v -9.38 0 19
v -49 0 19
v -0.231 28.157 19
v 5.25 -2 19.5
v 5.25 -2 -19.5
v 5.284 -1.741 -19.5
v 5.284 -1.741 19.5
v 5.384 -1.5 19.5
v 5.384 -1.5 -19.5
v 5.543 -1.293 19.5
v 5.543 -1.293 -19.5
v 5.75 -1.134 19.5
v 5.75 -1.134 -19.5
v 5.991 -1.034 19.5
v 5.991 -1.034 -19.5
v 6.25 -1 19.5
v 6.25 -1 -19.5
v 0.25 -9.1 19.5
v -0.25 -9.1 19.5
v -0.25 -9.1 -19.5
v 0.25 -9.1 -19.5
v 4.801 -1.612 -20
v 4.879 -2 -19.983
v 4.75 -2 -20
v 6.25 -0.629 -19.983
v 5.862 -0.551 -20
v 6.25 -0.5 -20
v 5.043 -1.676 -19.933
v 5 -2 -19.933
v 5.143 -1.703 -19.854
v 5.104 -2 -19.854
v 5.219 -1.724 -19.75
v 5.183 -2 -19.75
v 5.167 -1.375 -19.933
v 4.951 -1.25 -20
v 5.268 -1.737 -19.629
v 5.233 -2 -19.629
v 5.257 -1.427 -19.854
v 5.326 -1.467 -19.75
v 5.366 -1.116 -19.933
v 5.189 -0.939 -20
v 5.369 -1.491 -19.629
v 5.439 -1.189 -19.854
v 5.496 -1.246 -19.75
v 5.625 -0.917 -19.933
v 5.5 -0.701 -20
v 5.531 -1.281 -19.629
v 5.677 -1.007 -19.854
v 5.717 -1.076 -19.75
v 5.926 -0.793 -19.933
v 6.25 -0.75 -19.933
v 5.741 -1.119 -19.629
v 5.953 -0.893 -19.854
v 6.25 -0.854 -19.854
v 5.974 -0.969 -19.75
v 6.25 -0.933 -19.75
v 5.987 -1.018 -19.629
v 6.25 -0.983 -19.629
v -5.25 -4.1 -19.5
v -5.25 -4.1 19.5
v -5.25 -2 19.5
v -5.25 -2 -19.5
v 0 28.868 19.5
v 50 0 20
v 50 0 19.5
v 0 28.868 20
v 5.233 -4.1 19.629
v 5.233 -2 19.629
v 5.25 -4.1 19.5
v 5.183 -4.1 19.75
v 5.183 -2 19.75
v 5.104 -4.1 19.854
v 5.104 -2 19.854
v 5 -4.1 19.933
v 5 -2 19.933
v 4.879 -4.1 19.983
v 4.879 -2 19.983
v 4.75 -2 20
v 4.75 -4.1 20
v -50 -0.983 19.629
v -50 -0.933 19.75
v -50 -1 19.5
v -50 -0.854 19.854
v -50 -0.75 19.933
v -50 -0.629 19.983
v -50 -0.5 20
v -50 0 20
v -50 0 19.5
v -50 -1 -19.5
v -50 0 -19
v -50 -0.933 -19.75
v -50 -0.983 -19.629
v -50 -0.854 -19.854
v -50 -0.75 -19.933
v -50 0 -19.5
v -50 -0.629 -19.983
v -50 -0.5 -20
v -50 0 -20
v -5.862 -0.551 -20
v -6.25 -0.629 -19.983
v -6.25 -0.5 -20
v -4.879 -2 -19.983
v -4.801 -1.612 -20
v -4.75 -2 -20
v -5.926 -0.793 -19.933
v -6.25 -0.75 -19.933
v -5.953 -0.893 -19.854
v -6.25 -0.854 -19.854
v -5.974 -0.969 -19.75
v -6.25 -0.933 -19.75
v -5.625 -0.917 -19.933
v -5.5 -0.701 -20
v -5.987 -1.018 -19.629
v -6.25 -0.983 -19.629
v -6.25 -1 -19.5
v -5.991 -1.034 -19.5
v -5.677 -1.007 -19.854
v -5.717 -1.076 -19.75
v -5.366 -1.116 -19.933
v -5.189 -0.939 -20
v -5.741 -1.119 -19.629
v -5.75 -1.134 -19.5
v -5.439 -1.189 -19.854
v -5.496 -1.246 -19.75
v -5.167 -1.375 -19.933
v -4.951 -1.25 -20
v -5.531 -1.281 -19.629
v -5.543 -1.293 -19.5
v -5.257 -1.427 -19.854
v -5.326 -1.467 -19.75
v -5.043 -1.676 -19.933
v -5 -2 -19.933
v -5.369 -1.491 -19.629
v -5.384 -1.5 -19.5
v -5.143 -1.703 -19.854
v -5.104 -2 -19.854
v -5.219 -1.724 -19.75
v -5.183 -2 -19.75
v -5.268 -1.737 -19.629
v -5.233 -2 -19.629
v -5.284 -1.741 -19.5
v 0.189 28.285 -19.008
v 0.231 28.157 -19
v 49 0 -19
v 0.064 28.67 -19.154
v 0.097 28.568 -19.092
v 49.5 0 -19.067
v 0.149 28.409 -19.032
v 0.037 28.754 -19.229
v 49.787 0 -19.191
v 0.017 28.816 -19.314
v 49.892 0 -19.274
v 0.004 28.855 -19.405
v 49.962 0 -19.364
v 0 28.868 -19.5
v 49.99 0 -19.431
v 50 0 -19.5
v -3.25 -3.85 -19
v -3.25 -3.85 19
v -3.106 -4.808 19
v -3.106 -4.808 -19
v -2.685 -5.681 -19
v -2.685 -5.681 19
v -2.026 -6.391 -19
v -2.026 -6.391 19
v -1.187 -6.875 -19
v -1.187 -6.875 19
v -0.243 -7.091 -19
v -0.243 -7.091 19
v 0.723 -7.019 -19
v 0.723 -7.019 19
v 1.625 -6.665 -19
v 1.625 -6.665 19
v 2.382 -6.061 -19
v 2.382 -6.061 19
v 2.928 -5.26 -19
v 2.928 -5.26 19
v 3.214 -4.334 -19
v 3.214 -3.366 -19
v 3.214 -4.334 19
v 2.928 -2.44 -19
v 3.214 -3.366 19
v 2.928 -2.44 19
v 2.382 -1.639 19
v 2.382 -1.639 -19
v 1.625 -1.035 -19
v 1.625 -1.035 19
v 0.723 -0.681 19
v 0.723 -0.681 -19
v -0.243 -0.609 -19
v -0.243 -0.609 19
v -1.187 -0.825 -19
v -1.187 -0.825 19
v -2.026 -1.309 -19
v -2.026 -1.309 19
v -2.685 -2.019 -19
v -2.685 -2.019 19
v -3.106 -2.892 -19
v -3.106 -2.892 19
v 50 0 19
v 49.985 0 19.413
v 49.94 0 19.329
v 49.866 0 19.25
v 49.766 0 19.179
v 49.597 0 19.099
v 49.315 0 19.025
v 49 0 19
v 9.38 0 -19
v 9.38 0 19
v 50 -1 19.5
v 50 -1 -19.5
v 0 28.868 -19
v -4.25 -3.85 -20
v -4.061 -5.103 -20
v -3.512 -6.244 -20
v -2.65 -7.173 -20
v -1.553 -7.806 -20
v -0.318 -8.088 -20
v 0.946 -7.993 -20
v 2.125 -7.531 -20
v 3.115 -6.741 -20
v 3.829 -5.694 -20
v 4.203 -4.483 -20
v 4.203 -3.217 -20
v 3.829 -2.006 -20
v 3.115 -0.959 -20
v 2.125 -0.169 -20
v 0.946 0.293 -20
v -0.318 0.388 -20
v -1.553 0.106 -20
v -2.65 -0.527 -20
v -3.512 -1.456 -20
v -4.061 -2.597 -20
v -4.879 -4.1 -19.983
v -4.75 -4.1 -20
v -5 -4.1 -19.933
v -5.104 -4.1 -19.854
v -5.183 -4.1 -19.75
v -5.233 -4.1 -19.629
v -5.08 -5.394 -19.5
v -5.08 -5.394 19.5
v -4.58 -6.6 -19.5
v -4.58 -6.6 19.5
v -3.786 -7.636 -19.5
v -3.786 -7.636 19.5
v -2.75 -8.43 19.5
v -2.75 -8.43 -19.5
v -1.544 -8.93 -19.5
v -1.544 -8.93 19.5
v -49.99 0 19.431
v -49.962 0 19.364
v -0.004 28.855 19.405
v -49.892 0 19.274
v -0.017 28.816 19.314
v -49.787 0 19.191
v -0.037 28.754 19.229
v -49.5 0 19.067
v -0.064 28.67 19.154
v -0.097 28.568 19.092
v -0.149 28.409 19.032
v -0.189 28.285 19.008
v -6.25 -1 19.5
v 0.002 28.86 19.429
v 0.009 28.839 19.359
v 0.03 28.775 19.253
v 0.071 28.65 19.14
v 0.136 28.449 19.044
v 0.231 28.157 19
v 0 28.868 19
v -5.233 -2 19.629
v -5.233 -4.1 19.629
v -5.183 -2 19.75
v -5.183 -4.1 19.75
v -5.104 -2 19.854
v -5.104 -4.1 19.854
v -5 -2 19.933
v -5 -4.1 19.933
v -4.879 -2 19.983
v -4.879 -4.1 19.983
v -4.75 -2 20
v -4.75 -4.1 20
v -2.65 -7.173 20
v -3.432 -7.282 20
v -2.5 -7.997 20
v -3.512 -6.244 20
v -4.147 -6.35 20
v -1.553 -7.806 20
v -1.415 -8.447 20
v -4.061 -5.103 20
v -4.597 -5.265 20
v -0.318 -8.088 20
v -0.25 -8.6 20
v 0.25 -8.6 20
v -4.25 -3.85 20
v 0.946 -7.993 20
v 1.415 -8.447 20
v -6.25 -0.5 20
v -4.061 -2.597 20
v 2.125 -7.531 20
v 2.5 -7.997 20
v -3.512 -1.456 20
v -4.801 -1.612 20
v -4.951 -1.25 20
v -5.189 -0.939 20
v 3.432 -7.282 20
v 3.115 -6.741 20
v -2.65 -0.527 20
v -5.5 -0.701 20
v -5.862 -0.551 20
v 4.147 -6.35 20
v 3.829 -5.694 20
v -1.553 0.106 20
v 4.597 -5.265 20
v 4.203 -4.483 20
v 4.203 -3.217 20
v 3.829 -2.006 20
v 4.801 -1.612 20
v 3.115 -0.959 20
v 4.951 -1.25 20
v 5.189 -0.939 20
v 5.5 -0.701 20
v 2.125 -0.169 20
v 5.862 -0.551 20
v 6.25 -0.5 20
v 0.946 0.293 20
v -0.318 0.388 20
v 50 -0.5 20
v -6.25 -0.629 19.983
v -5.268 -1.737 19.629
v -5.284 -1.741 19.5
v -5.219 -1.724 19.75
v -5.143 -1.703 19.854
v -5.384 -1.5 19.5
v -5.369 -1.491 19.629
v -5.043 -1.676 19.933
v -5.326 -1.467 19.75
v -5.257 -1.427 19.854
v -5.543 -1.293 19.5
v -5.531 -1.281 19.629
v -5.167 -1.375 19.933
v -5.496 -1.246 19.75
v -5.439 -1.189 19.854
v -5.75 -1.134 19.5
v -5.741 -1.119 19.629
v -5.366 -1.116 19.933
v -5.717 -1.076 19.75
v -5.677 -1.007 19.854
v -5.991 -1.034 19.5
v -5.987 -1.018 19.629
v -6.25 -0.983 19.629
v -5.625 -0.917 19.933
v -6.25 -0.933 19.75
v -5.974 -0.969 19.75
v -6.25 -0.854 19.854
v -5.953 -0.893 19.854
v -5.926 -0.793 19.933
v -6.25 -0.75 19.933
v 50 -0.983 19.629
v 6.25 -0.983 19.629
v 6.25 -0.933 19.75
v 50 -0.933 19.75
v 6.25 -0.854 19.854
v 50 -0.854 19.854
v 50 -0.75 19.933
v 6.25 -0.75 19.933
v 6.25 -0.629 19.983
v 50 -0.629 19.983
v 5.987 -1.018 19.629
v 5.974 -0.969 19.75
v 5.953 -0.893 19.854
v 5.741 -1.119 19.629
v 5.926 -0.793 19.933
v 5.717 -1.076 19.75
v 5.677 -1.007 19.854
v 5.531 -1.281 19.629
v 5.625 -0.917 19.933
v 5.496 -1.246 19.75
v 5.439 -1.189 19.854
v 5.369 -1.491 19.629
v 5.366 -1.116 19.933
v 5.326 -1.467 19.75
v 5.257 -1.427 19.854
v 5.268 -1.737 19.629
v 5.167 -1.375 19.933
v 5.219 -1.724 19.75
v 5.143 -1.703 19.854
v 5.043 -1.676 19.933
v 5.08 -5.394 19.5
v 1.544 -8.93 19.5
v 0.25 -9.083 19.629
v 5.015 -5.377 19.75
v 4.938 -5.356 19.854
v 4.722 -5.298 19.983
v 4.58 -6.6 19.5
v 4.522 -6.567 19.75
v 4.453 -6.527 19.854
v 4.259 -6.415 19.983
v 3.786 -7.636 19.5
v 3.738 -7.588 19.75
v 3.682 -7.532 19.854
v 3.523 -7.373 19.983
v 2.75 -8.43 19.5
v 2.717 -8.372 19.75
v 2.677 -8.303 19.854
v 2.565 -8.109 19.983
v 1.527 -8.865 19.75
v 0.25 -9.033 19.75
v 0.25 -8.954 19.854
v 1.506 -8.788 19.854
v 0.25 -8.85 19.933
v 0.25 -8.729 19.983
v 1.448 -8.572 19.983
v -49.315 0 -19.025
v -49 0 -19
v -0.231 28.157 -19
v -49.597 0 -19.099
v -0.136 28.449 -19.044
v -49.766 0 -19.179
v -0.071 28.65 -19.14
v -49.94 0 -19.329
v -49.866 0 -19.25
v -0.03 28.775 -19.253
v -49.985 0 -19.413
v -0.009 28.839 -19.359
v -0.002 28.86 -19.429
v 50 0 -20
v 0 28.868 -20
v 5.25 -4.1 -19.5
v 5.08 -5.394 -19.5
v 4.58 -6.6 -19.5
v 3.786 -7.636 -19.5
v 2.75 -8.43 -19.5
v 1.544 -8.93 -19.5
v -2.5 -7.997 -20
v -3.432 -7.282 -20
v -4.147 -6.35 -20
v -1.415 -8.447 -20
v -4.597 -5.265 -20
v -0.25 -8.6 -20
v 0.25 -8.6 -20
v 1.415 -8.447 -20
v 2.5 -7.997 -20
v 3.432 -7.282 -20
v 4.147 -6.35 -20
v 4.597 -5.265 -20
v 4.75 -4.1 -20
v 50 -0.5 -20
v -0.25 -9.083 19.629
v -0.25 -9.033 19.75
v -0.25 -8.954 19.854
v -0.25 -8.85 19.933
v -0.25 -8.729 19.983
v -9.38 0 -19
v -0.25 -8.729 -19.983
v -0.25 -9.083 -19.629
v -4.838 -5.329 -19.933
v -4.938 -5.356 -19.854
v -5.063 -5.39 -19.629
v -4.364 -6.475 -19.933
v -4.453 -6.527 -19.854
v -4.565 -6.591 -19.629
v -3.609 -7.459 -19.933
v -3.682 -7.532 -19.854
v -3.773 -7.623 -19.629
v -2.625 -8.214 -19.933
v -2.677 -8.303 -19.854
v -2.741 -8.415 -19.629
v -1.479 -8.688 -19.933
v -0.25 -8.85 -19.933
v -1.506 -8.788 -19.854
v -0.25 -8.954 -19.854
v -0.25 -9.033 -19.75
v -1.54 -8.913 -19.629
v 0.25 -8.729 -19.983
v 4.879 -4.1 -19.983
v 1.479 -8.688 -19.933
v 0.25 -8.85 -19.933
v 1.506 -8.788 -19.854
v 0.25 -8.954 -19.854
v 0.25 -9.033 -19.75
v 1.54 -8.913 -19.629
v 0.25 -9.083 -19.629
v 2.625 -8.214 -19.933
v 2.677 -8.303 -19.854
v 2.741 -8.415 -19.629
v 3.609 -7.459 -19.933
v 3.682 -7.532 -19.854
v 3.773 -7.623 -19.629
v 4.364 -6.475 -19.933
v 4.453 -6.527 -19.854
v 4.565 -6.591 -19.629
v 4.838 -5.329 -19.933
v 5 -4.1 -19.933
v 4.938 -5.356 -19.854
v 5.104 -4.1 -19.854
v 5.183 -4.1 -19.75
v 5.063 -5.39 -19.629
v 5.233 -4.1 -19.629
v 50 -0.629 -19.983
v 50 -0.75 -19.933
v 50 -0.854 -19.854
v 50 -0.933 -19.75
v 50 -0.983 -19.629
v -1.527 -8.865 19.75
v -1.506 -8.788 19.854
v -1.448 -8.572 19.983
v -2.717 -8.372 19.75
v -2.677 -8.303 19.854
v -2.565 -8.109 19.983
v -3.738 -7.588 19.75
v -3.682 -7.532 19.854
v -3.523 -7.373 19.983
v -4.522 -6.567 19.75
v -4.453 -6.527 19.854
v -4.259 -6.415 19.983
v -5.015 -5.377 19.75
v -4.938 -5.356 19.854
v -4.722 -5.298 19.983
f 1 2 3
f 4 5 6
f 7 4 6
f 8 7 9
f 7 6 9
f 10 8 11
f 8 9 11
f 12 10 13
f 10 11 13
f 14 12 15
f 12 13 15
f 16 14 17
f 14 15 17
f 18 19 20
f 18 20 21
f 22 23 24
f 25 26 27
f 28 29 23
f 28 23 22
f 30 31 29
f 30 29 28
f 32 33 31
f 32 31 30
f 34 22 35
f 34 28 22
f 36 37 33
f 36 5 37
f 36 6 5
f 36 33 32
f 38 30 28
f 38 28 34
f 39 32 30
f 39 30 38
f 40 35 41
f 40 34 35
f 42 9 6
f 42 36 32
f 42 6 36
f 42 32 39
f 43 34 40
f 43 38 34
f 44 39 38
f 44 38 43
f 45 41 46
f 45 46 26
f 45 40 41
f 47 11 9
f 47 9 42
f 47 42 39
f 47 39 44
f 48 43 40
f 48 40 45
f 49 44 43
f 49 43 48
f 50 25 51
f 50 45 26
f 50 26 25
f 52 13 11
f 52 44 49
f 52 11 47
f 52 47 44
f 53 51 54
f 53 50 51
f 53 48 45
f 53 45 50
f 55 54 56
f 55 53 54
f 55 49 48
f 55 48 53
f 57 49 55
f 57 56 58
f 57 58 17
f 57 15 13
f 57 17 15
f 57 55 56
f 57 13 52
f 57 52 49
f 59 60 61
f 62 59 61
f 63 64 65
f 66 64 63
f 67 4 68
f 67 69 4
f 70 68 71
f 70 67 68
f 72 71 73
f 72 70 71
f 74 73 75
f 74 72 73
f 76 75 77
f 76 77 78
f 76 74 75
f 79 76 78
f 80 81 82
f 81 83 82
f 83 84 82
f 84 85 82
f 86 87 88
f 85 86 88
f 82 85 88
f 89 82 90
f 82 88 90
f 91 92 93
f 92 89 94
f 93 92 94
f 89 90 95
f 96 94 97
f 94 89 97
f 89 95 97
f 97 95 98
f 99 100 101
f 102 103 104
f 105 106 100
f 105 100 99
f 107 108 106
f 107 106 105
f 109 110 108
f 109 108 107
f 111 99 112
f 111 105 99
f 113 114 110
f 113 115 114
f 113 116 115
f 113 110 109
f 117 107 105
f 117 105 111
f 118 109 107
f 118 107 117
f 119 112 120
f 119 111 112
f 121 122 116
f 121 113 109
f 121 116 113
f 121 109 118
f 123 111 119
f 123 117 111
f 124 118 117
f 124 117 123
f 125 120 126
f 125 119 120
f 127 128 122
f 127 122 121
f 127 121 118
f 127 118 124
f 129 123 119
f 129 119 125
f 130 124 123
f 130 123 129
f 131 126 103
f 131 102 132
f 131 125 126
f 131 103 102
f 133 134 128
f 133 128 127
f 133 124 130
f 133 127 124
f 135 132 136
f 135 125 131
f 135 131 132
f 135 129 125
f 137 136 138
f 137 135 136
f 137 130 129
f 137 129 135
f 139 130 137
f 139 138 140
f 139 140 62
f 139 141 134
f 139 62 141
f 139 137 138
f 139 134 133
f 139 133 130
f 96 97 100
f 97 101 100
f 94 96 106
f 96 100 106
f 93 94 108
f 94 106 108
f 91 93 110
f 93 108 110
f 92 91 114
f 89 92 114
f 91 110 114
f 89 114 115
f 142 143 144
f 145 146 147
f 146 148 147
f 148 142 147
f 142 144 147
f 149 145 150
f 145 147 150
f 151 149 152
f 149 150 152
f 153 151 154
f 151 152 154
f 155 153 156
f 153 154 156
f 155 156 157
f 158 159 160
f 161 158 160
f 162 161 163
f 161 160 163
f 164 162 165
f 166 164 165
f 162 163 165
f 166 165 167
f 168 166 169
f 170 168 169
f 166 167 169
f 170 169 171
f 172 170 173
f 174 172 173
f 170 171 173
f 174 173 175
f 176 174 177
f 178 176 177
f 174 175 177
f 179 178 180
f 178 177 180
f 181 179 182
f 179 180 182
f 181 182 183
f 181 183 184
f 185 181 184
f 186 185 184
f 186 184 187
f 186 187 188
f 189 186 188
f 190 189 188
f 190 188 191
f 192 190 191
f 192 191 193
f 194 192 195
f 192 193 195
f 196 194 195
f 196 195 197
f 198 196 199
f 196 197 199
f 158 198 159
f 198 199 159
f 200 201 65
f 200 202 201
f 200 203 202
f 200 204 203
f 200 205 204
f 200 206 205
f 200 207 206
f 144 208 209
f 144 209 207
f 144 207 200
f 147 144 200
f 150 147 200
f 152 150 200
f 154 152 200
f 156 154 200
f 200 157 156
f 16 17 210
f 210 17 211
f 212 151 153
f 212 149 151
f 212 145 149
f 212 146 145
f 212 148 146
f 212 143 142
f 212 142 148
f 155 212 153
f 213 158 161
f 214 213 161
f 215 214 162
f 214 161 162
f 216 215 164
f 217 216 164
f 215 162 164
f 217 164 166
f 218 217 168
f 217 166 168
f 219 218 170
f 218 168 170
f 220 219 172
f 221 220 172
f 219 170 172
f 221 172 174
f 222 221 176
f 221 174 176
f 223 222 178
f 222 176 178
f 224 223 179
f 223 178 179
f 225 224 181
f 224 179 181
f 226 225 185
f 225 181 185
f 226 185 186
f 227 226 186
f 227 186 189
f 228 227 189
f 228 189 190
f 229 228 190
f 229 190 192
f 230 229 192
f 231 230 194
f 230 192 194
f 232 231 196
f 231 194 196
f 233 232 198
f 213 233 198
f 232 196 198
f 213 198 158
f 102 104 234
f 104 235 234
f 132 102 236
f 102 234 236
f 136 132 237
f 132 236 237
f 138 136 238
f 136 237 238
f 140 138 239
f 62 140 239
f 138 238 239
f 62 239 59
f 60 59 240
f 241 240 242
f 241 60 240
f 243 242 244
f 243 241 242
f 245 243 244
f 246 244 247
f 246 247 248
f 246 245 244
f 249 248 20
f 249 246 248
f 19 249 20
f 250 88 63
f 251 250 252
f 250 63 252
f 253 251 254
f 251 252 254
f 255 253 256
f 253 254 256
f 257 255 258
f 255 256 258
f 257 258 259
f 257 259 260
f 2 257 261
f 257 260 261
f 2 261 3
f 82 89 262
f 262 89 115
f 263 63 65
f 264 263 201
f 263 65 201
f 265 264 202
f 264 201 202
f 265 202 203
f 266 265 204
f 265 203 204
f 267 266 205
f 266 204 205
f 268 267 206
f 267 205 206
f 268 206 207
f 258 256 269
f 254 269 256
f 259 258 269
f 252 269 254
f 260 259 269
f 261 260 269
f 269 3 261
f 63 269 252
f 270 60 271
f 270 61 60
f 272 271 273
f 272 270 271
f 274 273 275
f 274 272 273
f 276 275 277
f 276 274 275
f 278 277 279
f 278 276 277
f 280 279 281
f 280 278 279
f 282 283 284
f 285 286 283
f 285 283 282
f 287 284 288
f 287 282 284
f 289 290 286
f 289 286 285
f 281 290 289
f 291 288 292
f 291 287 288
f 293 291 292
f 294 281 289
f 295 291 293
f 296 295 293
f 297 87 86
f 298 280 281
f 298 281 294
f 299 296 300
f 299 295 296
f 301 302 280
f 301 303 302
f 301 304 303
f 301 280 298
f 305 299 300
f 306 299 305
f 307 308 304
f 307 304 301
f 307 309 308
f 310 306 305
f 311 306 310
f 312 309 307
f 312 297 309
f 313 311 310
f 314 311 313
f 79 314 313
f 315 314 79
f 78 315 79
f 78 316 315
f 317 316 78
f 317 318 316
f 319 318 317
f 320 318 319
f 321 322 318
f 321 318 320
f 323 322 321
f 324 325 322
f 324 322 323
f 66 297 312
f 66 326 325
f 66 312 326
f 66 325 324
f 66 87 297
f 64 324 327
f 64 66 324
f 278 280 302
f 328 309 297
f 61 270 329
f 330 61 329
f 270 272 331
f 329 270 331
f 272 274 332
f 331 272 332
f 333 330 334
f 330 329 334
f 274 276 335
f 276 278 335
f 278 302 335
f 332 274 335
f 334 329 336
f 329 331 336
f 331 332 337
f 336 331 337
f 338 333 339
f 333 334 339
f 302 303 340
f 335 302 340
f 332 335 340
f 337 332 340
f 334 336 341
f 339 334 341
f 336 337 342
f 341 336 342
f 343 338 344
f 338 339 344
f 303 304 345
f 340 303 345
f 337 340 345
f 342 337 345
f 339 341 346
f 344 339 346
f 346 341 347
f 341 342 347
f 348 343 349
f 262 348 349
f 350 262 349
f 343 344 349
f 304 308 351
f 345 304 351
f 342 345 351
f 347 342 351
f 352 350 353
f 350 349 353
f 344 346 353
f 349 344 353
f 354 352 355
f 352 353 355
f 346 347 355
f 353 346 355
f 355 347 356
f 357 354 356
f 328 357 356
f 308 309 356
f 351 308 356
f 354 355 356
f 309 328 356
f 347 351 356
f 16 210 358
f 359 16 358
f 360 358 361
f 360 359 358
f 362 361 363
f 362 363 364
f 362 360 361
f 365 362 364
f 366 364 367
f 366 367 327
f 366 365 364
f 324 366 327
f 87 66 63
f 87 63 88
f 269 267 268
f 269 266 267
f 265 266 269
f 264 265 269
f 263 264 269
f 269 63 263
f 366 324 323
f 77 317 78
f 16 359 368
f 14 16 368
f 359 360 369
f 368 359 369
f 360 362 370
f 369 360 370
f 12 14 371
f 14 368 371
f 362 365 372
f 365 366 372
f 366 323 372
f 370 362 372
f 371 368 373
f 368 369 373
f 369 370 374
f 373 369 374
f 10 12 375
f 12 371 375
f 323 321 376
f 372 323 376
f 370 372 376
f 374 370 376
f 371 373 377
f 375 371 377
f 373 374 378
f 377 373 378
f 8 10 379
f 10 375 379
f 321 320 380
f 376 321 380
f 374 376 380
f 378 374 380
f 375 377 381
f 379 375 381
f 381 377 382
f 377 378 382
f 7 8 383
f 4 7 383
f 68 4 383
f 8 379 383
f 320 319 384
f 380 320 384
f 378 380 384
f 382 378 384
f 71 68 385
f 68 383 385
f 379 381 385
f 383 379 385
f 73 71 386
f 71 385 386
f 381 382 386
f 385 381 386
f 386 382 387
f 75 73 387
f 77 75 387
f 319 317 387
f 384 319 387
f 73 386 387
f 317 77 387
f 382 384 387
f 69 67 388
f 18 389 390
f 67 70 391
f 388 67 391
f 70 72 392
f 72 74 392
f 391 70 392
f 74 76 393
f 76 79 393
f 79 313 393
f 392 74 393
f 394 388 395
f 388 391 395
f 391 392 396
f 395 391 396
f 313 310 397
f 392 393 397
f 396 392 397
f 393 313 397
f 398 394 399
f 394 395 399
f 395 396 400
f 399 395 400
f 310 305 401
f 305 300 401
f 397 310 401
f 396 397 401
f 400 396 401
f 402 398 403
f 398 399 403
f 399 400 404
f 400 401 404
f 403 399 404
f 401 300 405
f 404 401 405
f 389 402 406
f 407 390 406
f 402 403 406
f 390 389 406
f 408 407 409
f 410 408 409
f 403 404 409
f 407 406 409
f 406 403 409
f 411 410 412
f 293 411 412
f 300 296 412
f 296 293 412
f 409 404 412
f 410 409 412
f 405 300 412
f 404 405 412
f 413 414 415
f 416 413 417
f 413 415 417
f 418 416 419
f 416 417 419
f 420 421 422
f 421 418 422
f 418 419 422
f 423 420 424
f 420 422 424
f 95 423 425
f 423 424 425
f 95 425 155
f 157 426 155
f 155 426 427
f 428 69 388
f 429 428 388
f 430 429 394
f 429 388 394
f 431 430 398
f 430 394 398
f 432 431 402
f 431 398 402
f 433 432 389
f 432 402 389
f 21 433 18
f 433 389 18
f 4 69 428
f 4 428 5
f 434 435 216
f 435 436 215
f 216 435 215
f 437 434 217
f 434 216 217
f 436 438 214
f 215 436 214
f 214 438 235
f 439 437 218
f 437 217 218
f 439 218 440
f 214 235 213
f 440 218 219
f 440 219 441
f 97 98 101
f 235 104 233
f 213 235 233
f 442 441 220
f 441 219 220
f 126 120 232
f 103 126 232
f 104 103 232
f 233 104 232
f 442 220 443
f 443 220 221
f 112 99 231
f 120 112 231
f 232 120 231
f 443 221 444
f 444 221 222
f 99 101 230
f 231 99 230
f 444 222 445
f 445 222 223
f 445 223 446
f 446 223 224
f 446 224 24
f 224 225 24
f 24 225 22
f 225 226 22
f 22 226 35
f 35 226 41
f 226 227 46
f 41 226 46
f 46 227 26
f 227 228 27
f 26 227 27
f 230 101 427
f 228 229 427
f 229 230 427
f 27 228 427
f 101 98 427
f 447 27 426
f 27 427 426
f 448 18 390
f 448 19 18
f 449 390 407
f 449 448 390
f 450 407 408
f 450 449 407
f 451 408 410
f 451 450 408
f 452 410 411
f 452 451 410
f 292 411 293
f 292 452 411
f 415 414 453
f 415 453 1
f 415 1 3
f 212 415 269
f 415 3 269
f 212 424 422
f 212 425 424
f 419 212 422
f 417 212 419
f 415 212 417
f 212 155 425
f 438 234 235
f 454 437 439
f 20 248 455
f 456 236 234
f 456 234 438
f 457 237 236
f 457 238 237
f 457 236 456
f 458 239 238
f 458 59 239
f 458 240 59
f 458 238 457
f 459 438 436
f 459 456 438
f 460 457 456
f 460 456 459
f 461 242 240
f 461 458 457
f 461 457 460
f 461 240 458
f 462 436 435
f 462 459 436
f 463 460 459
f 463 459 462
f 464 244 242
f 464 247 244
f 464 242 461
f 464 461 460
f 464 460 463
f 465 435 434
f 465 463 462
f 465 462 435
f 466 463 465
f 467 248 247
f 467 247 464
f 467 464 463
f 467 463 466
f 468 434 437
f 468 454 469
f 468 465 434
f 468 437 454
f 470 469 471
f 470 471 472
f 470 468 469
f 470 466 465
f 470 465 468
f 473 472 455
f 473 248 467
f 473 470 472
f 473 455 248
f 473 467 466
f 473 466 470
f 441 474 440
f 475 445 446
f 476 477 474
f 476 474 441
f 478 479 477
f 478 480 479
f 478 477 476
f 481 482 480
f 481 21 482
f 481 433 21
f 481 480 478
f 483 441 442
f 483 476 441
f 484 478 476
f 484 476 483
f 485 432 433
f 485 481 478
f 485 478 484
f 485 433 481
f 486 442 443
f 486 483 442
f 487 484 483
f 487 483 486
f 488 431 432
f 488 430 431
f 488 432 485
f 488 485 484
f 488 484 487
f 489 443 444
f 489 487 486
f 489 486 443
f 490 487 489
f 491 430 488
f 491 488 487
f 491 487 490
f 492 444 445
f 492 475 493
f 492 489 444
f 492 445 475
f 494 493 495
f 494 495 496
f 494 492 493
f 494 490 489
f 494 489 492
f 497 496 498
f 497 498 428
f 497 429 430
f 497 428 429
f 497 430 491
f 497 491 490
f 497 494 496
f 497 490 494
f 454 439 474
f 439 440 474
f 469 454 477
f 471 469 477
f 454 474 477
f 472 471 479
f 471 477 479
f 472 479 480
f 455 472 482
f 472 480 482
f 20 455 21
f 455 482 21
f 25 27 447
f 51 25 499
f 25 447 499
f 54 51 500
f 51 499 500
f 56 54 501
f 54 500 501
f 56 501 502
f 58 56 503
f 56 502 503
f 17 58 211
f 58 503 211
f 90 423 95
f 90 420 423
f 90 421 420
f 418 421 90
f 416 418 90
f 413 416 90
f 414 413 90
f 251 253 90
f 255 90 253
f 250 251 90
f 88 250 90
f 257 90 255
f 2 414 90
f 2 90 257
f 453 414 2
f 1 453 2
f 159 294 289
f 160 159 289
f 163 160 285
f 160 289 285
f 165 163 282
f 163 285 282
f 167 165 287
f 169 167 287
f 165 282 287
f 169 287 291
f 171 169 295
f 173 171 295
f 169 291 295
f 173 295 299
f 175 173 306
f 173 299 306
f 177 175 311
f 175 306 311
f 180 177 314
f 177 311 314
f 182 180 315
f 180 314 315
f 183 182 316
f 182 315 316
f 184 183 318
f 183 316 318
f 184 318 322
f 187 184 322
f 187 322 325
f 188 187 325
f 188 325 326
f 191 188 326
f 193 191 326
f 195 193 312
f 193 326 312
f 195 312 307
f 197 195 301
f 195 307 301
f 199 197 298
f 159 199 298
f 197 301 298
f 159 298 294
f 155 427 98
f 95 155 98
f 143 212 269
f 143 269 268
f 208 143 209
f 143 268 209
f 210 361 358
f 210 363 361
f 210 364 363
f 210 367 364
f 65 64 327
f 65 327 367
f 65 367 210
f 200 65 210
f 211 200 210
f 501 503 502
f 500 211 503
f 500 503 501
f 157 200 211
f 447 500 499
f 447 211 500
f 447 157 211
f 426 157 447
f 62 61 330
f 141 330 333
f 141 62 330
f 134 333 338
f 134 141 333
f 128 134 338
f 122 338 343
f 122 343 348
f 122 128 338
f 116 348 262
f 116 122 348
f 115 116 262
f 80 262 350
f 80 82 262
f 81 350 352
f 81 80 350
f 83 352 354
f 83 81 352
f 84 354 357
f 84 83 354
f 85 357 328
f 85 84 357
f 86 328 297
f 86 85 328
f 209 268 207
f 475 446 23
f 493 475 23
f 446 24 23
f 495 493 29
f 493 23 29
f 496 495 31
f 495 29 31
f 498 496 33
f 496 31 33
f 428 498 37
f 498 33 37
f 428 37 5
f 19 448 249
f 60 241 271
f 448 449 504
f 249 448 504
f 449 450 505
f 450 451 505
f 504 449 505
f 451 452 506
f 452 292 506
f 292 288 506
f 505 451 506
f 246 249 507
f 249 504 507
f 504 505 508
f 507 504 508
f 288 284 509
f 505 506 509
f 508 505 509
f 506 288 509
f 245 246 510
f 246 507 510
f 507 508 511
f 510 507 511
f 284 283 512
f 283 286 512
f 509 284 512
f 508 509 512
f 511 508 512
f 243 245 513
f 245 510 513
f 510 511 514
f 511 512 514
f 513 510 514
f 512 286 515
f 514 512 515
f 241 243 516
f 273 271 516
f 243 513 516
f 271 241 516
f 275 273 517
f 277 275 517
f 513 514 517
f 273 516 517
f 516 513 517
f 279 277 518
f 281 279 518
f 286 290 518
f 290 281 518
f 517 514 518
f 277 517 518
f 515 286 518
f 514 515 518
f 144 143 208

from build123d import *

# Parameters (mm, degrees)
SALIENTE_EXTRUIR1_DEPTH = 1
CROQUIS3_W              = 100
CROQUIS3_H              = 40
SALIENTE_EXTRUIR2_DEPTH = 1
CROQUIS5_W              = 10.5
CROQUIS5_H              = 8.1
SALIENTE_EXTRUIR3_DEPTH = 20
SALIENTE_EXTRUIR4_DEPTH = 20
CROQUIS7_R              = 3.25
CORTAR_EXTRUIR1_DEPTH   = 100
REDONDEO2_R             = 5
CHAFL_N2_SIZE           = 1
REDONDEO3_R             = 1
REDONDEO4_R             = 0.5
REDONDEO5_R             = 0.5


with BuildPart() as part:
    # Croquis1 → Saliente-Extruir1 (new body)
    with BuildSketch(Plane.XY.offset(20)):
        Polygon((-50, 0), (50, 0), (0, 28.867513459), align=None)
    extrude(amount=-SALIENTE_EXTRUIR1_DEPTH)


with BuildPart() as body_2:
    # Simetría4: mirrored copy
    add(part.part.mirror(Plane.XY))


with BuildPart() as part_1:
    add(part.part)

    add(body_2.part)  # Saliente-Extruir2 merges body 2
    # Croquis3 → Saliente-Extruir2 (add)
    with BuildSketch(Plane(origin=(0, 0, 0), x_dir=(1, 0, 0), z_dir=(0, 1, 0))):
        Rectangle(CROQUIS3_W, CROQUIS3_H)
    extrude(amount=-SALIENTE_EXTRUIR2_DEPTH)

    # Croquis5 → Saliente-Extruir3 (add, symmetric)
    with BuildSketch(Plane.XY):
        with Locations((0, -5.05)):
            Rectangle(CROQUIS5_W, CROQUIS5_H)
    extrude(amount=SALIENTE_EXTRUIR3_DEPTH, both=True)

    # Croquis6 → Saliente-Extruir4 (add, symmetric)
    with BuildSketch(Plane.XY):
        Polygon((0, 28.867513459), (9.379623704, 0), (-9.379623704, 0), align=None)
    extrude(amount=SALIENTE_EXTRUIR4_DEPTH, both=True)

    # Croquis7 → Cortar-Extruir1 (cut, symmetric)
    with BuildSketch(Plane.XY.offset(-19)):
        with Locations(Location((0, -3.85, 0), (0, 0, 180))):
            Circle(CROQUIS7_R)
    extrude(amount=CORTAR_EXTRUIR1_DEPTH, both=True, mode=Mode.SUBTRACT)

    # Redondeo2
    redondeo2_edges = [part_1.edges().sort_by_distance(p)[0] for p in [
        (-5.25, -9.1, 0),
        (5.25, -9.1, 0),
    ]]
    fillet(redondeo2_edges, radius=REDONDEO2_R)

    # Chaflán2
    chafl_n2_edges = [part_1.edges().sort_by_distance(p)[0] for p in [
        (3.25, -3.85, -20),
        (3.25, -3.85, 20),
    ]]
    chamfer(chafl_n2_edges, length=CHAFL_N2_SIZE)

    # Redondeo3
    redondeo3_edges = [part_1.edges().sort_by_distance(p)[0] for p in [
        (5.25, -1, 0),
        (-5.25, -1, 0),
    ]]
    fillet(redondeo3_edges, radius=REDONDEO3_R)

    # Redondeo4
    redondeo4_edges = [part_1.edges().sort_by_distance(p)[0] for p in [
        (-5.542893219, -1.292893219, 20),
        (-28.125, -1, 20),
        (28.125, -1, -20),
        (5.25, -3.05, -20),
        (5.25, -3.05, 20),
        (0, -9.1, -20),
        (-3.785533906, -7.635533906, -20),
        (3.785533906, -7.635533906, -20),
        (0, -9.1, 20),
        (-3.785533906, -7.635533906, 20),
        (3.785533906, -7.635533906, 20),
        (28.125, -1, 20),
        (-5.25, -3.05, -20),
        (-5.25, -3.05, 20),
        (-28.125, -1, -20),
        (5.542893219, -1.292893219, -20),
        (5.542893219, -1.292893219, 20),
        (-5.542893219, -1.292893219, -20),
    ]]
    fillet(redondeo4_edges, radius=REDONDEO4_R)

    # Redondeo5
    # the kernel refuses this fillet: 0.5 mm, written as the material it takes off along each edge
    with BuildSketch(Plane(origin=(1.082531755, 29.492513459, 19), x_dir=(0, 0, 1), z_dir=(-0.8660254037844387, -0.5000000000000001, 0))) as redondeo5_piece_1_section:
        with BuildLine():
            CenterArc((REDONDEO5_R, -REDONDEO5_R), REDONDEO5_R, 90, 90)
            Line((0, -REDONDEO5_R), (0, 0))
            Line((0, 0), (REDONDEO5_R, 0))
        make_face()
    redondeo5_piece_1 = extrude(amount=60.235026919, mode=Mode.PRIVATE)
    redondeo5_piece_1 = split(redondeo5_piece_1, bisect_by=Plane(origin=(0.055315574, 28.697269627, 19.065385241), z_dir=(0.9510565162951544, 0.30901699437494506, 0)), keep=Keep.TOP, mode=Mode.PRIVATE)
    add(redondeo5_piece_1, mode=Mode.SUBTRACT)
    with BuildSketch(Plane(origin=(1.082531755, 29.492513459, 19), x_dir=(0, 0, 1), z_dir=(-0.8660254037844387, -0.5000000000000001, 0))) as redondeo5_piece_2_section:
        with BuildLine():
            CenterArc((REDONDEO5_R, -REDONDEO5_R), REDONDEO5_R, 90, 90)
            Line((0, -REDONDEO5_R), (0, 0))
            Line((0, 0), (REDONDEO5_R, 0))
        make_face()
    redondeo5_piece_2 = extrude(amount=60.235026919, mode=Mode.PRIVATE)
    redondeo5_piece_2 = split(redondeo5_piece_2, bisect_by=Plane(origin=(-24.914439582, 0, 19.11193997), z_dir=(0, 1, 0)), keep=Keep.TOP, mode=Mode.PRIVATE)
    redondeo5_piece_2 = split(redondeo5_piece_2, bisect_by=Plane(origin=(-6.644327312, 8.418376676, 19.11193997), z_dir=(-0.9510565162951545, 0.30901699437494473, 0)), keep=Keep.TOP, mode=Mode.PRIVATE)
    add(redondeo5_piece_2, mode=Mode.SUBTRACT)
    with BuildSketch(Plane(origin=(51.082531755, -0.625, -19), x_dir=(0, 0, -1), z_dir=(-0.8660254037844388, 0.49999999999999983, 0))) as redondeo5_piece_3_section:
        with BuildLine():
            CenterArc((REDONDEO5_R, REDONDEO5_R), REDONDEO5_R, 180, 90)
            Line((0, REDONDEO5_R), (0, 0))
            Line((0, 0), (REDONDEO5_R, 0))
        make_face()
    redondeo5_piece_3 = extrude(amount=60.235026919, mode=Mode.PRIVATE)
    redondeo5_piece_3 = split(redondeo5_piece_3, bisect_by=Plane(origin=(24.914439582, 0, -19.11193997), z_dir=(0, 1, 0)), keep=Keep.TOP, mode=Mode.PRIVATE)
    redondeo5_piece_3 = split(redondeo5_piece_3, bisect_by=Plane(origin=(6.644327312, 8.418376676, -19.11193997), z_dir=(0.9510565162951544, 0.30901699437494506, 0)), keep=Keep.TOP, mode=Mode.PRIVATE)
    add(redondeo5_piece_3, mode=Mode.SUBTRACT)
    with BuildSketch(Plane(origin=(51.082531755, -0.625, -19), x_dir=(0, 0, -1), z_dir=(-0.8660254037844388, 0.49999999999999983, 0))) as redondeo5_piece_4_section:
        with BuildLine():
            CenterArc((REDONDEO5_R, REDONDEO5_R), REDONDEO5_R, 180, 90)
            Line((0, REDONDEO5_R), (0, 0))
            Line((0, 0), (REDONDEO5_R, 0))
        make_face()
    redondeo5_piece_4 = extrude(amount=60.235026919, mode=Mode.PRIVATE)
    redondeo5_piece_4 = split(redondeo5_piece_4, bisect_by=Plane(origin=(-0.055315574, 28.697269627, -19.065385241), z_dir=(-0.9510565162951545, 0.30901699437494473, 0)), keep=Keep.TOP, mode=Mode.PRIVATE)
    add(redondeo5_piece_4, mode=Mode.SUBTRACT)
    with BuildSketch(Plane(origin=(1.082531755, 29.492513459, -19), x_dir=(0, 0, -1), z_dir=(-0.8660254037844387, -0.5000000000000001, 0))) as redondeo5_piece_5_section:
        with BuildLine():
            CenterArc((REDONDEO5_R, REDONDEO5_R), REDONDEO5_R, 180, 90)
            Line((0, REDONDEO5_R), (0, 0))
            Line((0, 0), (REDONDEO5_R, 0))
        make_face()
    redondeo5_piece_5 = extrude(amount=60.235026919, mode=Mode.PRIVATE)
    redondeo5_piece_5 = split(redondeo5_piece_5, bisect_by=Plane(origin=(0.055315574, 28.697269627, -19.065385241), z_dir=(0.9510565162951544, 0.30901699437494506, 0)), keep=Keep.TOP, mode=Mode.PRIVATE)
    add(redondeo5_piece_5, mode=Mode.SUBTRACT)
    with BuildSketch(Plane(origin=(1.082531755, 29.492513459, -19), x_dir=(0, 0, -1), z_dir=(-0.8660254037844387, -0.5000000000000001, 0))) as redondeo5_piece_6_section:
        with BuildLine():
            CenterArc((REDONDEO5_R, REDONDEO5_R), REDONDEO5_R, 180, 90)
            Line((0, REDONDEO5_R), (0, 0))
            Line((0, 0), (REDONDEO5_R, 0))
        make_face()
    redondeo5_piece_6 = extrude(amount=60.235026919, mode=Mode.PRIVATE)
    redondeo5_piece_6 = split(redondeo5_piece_6, bisect_by=Plane(origin=(-24.914439582, 0, -19.11193997), z_dir=(0, 1, 0)), keep=Keep.TOP, mode=Mode.PRIVATE)
    redondeo5_piece_6 = split(redondeo5_piece_6, bisect_by=Plane(origin=(-6.644327312, 8.418376676, -19.11193997), z_dir=(-0.9510565162951545, 0.30901699437494473, 0)), keep=Keep.TOP, mode=Mode.PRIVATE)
    add(redondeo5_piece_6, mode=Mode.SUBTRACT)
    with BuildSketch(Plane(origin=(51.082531755, -0.625, 19), x_dir=(0, 0, 1), z_dir=(-0.8660254037844388, 0.49999999999999983, 0))) as redondeo5_piece_7_section:
        with BuildLine():
            CenterArc((REDONDEO5_R, -REDONDEO5_R), REDONDEO5_R, 90, 90)
            Line((0, -REDONDEO5_R), (0, 0))
            Line((0, 0), (REDONDEO5_R, 0))
        make_face()
    redondeo5_piece_7 = extrude(amount=60.235026919, mode=Mode.PRIVATE)
    redondeo5_piece_7 = split(redondeo5_piece_7, bisect_by=Plane(origin=(24.914439582, 0, 19.11193997), z_dir=(0, 1, 0)), keep=Keep.TOP, mode=Mode.PRIVATE)
    redondeo5_piece_7 = split(redondeo5_piece_7, bisect_by=Plane(origin=(6.644327312, 8.418376676, 19.11193997), z_dir=(0.9510565162951544, 0.30901699437494506, 0)), keep=Keep.TOP, mode=Mode.PRIVATE)
    add(redondeo5_piece_7, mode=Mode.SUBTRACT)
    with BuildSketch(Plane(origin=(51.082531755, -0.625, 19), x_dir=(0, 0, 1), z_dir=(-0.8660254037844388, 0.49999999999999983, 0))) as redondeo5_piece_8_section:
        with BuildLine():
            CenterArc((REDONDEO5_R, -REDONDEO5_R), REDONDEO5_R, 90, 90)
            Line((0, -REDONDEO5_R), (0, 0))
            Line((0, 0), (REDONDEO5_R, 0))
        make_face()
    redondeo5_piece_8 = extrude(amount=60.235026919, mode=Mode.PRIVATE)
    redondeo5_piece_8 = split(redondeo5_piece_8, bisect_by=Plane(origin=(-0.055315574, 28.697269627, 19.065385241), z_dir=(-0.9510565162951545, 0.30901699437494473, 0)), keep=Keep.TOP, mode=Mode.PRIVATE)
    add(redondeo5_piece_8, mode=Mode.SUBTRACT)


solid = part_1.part
